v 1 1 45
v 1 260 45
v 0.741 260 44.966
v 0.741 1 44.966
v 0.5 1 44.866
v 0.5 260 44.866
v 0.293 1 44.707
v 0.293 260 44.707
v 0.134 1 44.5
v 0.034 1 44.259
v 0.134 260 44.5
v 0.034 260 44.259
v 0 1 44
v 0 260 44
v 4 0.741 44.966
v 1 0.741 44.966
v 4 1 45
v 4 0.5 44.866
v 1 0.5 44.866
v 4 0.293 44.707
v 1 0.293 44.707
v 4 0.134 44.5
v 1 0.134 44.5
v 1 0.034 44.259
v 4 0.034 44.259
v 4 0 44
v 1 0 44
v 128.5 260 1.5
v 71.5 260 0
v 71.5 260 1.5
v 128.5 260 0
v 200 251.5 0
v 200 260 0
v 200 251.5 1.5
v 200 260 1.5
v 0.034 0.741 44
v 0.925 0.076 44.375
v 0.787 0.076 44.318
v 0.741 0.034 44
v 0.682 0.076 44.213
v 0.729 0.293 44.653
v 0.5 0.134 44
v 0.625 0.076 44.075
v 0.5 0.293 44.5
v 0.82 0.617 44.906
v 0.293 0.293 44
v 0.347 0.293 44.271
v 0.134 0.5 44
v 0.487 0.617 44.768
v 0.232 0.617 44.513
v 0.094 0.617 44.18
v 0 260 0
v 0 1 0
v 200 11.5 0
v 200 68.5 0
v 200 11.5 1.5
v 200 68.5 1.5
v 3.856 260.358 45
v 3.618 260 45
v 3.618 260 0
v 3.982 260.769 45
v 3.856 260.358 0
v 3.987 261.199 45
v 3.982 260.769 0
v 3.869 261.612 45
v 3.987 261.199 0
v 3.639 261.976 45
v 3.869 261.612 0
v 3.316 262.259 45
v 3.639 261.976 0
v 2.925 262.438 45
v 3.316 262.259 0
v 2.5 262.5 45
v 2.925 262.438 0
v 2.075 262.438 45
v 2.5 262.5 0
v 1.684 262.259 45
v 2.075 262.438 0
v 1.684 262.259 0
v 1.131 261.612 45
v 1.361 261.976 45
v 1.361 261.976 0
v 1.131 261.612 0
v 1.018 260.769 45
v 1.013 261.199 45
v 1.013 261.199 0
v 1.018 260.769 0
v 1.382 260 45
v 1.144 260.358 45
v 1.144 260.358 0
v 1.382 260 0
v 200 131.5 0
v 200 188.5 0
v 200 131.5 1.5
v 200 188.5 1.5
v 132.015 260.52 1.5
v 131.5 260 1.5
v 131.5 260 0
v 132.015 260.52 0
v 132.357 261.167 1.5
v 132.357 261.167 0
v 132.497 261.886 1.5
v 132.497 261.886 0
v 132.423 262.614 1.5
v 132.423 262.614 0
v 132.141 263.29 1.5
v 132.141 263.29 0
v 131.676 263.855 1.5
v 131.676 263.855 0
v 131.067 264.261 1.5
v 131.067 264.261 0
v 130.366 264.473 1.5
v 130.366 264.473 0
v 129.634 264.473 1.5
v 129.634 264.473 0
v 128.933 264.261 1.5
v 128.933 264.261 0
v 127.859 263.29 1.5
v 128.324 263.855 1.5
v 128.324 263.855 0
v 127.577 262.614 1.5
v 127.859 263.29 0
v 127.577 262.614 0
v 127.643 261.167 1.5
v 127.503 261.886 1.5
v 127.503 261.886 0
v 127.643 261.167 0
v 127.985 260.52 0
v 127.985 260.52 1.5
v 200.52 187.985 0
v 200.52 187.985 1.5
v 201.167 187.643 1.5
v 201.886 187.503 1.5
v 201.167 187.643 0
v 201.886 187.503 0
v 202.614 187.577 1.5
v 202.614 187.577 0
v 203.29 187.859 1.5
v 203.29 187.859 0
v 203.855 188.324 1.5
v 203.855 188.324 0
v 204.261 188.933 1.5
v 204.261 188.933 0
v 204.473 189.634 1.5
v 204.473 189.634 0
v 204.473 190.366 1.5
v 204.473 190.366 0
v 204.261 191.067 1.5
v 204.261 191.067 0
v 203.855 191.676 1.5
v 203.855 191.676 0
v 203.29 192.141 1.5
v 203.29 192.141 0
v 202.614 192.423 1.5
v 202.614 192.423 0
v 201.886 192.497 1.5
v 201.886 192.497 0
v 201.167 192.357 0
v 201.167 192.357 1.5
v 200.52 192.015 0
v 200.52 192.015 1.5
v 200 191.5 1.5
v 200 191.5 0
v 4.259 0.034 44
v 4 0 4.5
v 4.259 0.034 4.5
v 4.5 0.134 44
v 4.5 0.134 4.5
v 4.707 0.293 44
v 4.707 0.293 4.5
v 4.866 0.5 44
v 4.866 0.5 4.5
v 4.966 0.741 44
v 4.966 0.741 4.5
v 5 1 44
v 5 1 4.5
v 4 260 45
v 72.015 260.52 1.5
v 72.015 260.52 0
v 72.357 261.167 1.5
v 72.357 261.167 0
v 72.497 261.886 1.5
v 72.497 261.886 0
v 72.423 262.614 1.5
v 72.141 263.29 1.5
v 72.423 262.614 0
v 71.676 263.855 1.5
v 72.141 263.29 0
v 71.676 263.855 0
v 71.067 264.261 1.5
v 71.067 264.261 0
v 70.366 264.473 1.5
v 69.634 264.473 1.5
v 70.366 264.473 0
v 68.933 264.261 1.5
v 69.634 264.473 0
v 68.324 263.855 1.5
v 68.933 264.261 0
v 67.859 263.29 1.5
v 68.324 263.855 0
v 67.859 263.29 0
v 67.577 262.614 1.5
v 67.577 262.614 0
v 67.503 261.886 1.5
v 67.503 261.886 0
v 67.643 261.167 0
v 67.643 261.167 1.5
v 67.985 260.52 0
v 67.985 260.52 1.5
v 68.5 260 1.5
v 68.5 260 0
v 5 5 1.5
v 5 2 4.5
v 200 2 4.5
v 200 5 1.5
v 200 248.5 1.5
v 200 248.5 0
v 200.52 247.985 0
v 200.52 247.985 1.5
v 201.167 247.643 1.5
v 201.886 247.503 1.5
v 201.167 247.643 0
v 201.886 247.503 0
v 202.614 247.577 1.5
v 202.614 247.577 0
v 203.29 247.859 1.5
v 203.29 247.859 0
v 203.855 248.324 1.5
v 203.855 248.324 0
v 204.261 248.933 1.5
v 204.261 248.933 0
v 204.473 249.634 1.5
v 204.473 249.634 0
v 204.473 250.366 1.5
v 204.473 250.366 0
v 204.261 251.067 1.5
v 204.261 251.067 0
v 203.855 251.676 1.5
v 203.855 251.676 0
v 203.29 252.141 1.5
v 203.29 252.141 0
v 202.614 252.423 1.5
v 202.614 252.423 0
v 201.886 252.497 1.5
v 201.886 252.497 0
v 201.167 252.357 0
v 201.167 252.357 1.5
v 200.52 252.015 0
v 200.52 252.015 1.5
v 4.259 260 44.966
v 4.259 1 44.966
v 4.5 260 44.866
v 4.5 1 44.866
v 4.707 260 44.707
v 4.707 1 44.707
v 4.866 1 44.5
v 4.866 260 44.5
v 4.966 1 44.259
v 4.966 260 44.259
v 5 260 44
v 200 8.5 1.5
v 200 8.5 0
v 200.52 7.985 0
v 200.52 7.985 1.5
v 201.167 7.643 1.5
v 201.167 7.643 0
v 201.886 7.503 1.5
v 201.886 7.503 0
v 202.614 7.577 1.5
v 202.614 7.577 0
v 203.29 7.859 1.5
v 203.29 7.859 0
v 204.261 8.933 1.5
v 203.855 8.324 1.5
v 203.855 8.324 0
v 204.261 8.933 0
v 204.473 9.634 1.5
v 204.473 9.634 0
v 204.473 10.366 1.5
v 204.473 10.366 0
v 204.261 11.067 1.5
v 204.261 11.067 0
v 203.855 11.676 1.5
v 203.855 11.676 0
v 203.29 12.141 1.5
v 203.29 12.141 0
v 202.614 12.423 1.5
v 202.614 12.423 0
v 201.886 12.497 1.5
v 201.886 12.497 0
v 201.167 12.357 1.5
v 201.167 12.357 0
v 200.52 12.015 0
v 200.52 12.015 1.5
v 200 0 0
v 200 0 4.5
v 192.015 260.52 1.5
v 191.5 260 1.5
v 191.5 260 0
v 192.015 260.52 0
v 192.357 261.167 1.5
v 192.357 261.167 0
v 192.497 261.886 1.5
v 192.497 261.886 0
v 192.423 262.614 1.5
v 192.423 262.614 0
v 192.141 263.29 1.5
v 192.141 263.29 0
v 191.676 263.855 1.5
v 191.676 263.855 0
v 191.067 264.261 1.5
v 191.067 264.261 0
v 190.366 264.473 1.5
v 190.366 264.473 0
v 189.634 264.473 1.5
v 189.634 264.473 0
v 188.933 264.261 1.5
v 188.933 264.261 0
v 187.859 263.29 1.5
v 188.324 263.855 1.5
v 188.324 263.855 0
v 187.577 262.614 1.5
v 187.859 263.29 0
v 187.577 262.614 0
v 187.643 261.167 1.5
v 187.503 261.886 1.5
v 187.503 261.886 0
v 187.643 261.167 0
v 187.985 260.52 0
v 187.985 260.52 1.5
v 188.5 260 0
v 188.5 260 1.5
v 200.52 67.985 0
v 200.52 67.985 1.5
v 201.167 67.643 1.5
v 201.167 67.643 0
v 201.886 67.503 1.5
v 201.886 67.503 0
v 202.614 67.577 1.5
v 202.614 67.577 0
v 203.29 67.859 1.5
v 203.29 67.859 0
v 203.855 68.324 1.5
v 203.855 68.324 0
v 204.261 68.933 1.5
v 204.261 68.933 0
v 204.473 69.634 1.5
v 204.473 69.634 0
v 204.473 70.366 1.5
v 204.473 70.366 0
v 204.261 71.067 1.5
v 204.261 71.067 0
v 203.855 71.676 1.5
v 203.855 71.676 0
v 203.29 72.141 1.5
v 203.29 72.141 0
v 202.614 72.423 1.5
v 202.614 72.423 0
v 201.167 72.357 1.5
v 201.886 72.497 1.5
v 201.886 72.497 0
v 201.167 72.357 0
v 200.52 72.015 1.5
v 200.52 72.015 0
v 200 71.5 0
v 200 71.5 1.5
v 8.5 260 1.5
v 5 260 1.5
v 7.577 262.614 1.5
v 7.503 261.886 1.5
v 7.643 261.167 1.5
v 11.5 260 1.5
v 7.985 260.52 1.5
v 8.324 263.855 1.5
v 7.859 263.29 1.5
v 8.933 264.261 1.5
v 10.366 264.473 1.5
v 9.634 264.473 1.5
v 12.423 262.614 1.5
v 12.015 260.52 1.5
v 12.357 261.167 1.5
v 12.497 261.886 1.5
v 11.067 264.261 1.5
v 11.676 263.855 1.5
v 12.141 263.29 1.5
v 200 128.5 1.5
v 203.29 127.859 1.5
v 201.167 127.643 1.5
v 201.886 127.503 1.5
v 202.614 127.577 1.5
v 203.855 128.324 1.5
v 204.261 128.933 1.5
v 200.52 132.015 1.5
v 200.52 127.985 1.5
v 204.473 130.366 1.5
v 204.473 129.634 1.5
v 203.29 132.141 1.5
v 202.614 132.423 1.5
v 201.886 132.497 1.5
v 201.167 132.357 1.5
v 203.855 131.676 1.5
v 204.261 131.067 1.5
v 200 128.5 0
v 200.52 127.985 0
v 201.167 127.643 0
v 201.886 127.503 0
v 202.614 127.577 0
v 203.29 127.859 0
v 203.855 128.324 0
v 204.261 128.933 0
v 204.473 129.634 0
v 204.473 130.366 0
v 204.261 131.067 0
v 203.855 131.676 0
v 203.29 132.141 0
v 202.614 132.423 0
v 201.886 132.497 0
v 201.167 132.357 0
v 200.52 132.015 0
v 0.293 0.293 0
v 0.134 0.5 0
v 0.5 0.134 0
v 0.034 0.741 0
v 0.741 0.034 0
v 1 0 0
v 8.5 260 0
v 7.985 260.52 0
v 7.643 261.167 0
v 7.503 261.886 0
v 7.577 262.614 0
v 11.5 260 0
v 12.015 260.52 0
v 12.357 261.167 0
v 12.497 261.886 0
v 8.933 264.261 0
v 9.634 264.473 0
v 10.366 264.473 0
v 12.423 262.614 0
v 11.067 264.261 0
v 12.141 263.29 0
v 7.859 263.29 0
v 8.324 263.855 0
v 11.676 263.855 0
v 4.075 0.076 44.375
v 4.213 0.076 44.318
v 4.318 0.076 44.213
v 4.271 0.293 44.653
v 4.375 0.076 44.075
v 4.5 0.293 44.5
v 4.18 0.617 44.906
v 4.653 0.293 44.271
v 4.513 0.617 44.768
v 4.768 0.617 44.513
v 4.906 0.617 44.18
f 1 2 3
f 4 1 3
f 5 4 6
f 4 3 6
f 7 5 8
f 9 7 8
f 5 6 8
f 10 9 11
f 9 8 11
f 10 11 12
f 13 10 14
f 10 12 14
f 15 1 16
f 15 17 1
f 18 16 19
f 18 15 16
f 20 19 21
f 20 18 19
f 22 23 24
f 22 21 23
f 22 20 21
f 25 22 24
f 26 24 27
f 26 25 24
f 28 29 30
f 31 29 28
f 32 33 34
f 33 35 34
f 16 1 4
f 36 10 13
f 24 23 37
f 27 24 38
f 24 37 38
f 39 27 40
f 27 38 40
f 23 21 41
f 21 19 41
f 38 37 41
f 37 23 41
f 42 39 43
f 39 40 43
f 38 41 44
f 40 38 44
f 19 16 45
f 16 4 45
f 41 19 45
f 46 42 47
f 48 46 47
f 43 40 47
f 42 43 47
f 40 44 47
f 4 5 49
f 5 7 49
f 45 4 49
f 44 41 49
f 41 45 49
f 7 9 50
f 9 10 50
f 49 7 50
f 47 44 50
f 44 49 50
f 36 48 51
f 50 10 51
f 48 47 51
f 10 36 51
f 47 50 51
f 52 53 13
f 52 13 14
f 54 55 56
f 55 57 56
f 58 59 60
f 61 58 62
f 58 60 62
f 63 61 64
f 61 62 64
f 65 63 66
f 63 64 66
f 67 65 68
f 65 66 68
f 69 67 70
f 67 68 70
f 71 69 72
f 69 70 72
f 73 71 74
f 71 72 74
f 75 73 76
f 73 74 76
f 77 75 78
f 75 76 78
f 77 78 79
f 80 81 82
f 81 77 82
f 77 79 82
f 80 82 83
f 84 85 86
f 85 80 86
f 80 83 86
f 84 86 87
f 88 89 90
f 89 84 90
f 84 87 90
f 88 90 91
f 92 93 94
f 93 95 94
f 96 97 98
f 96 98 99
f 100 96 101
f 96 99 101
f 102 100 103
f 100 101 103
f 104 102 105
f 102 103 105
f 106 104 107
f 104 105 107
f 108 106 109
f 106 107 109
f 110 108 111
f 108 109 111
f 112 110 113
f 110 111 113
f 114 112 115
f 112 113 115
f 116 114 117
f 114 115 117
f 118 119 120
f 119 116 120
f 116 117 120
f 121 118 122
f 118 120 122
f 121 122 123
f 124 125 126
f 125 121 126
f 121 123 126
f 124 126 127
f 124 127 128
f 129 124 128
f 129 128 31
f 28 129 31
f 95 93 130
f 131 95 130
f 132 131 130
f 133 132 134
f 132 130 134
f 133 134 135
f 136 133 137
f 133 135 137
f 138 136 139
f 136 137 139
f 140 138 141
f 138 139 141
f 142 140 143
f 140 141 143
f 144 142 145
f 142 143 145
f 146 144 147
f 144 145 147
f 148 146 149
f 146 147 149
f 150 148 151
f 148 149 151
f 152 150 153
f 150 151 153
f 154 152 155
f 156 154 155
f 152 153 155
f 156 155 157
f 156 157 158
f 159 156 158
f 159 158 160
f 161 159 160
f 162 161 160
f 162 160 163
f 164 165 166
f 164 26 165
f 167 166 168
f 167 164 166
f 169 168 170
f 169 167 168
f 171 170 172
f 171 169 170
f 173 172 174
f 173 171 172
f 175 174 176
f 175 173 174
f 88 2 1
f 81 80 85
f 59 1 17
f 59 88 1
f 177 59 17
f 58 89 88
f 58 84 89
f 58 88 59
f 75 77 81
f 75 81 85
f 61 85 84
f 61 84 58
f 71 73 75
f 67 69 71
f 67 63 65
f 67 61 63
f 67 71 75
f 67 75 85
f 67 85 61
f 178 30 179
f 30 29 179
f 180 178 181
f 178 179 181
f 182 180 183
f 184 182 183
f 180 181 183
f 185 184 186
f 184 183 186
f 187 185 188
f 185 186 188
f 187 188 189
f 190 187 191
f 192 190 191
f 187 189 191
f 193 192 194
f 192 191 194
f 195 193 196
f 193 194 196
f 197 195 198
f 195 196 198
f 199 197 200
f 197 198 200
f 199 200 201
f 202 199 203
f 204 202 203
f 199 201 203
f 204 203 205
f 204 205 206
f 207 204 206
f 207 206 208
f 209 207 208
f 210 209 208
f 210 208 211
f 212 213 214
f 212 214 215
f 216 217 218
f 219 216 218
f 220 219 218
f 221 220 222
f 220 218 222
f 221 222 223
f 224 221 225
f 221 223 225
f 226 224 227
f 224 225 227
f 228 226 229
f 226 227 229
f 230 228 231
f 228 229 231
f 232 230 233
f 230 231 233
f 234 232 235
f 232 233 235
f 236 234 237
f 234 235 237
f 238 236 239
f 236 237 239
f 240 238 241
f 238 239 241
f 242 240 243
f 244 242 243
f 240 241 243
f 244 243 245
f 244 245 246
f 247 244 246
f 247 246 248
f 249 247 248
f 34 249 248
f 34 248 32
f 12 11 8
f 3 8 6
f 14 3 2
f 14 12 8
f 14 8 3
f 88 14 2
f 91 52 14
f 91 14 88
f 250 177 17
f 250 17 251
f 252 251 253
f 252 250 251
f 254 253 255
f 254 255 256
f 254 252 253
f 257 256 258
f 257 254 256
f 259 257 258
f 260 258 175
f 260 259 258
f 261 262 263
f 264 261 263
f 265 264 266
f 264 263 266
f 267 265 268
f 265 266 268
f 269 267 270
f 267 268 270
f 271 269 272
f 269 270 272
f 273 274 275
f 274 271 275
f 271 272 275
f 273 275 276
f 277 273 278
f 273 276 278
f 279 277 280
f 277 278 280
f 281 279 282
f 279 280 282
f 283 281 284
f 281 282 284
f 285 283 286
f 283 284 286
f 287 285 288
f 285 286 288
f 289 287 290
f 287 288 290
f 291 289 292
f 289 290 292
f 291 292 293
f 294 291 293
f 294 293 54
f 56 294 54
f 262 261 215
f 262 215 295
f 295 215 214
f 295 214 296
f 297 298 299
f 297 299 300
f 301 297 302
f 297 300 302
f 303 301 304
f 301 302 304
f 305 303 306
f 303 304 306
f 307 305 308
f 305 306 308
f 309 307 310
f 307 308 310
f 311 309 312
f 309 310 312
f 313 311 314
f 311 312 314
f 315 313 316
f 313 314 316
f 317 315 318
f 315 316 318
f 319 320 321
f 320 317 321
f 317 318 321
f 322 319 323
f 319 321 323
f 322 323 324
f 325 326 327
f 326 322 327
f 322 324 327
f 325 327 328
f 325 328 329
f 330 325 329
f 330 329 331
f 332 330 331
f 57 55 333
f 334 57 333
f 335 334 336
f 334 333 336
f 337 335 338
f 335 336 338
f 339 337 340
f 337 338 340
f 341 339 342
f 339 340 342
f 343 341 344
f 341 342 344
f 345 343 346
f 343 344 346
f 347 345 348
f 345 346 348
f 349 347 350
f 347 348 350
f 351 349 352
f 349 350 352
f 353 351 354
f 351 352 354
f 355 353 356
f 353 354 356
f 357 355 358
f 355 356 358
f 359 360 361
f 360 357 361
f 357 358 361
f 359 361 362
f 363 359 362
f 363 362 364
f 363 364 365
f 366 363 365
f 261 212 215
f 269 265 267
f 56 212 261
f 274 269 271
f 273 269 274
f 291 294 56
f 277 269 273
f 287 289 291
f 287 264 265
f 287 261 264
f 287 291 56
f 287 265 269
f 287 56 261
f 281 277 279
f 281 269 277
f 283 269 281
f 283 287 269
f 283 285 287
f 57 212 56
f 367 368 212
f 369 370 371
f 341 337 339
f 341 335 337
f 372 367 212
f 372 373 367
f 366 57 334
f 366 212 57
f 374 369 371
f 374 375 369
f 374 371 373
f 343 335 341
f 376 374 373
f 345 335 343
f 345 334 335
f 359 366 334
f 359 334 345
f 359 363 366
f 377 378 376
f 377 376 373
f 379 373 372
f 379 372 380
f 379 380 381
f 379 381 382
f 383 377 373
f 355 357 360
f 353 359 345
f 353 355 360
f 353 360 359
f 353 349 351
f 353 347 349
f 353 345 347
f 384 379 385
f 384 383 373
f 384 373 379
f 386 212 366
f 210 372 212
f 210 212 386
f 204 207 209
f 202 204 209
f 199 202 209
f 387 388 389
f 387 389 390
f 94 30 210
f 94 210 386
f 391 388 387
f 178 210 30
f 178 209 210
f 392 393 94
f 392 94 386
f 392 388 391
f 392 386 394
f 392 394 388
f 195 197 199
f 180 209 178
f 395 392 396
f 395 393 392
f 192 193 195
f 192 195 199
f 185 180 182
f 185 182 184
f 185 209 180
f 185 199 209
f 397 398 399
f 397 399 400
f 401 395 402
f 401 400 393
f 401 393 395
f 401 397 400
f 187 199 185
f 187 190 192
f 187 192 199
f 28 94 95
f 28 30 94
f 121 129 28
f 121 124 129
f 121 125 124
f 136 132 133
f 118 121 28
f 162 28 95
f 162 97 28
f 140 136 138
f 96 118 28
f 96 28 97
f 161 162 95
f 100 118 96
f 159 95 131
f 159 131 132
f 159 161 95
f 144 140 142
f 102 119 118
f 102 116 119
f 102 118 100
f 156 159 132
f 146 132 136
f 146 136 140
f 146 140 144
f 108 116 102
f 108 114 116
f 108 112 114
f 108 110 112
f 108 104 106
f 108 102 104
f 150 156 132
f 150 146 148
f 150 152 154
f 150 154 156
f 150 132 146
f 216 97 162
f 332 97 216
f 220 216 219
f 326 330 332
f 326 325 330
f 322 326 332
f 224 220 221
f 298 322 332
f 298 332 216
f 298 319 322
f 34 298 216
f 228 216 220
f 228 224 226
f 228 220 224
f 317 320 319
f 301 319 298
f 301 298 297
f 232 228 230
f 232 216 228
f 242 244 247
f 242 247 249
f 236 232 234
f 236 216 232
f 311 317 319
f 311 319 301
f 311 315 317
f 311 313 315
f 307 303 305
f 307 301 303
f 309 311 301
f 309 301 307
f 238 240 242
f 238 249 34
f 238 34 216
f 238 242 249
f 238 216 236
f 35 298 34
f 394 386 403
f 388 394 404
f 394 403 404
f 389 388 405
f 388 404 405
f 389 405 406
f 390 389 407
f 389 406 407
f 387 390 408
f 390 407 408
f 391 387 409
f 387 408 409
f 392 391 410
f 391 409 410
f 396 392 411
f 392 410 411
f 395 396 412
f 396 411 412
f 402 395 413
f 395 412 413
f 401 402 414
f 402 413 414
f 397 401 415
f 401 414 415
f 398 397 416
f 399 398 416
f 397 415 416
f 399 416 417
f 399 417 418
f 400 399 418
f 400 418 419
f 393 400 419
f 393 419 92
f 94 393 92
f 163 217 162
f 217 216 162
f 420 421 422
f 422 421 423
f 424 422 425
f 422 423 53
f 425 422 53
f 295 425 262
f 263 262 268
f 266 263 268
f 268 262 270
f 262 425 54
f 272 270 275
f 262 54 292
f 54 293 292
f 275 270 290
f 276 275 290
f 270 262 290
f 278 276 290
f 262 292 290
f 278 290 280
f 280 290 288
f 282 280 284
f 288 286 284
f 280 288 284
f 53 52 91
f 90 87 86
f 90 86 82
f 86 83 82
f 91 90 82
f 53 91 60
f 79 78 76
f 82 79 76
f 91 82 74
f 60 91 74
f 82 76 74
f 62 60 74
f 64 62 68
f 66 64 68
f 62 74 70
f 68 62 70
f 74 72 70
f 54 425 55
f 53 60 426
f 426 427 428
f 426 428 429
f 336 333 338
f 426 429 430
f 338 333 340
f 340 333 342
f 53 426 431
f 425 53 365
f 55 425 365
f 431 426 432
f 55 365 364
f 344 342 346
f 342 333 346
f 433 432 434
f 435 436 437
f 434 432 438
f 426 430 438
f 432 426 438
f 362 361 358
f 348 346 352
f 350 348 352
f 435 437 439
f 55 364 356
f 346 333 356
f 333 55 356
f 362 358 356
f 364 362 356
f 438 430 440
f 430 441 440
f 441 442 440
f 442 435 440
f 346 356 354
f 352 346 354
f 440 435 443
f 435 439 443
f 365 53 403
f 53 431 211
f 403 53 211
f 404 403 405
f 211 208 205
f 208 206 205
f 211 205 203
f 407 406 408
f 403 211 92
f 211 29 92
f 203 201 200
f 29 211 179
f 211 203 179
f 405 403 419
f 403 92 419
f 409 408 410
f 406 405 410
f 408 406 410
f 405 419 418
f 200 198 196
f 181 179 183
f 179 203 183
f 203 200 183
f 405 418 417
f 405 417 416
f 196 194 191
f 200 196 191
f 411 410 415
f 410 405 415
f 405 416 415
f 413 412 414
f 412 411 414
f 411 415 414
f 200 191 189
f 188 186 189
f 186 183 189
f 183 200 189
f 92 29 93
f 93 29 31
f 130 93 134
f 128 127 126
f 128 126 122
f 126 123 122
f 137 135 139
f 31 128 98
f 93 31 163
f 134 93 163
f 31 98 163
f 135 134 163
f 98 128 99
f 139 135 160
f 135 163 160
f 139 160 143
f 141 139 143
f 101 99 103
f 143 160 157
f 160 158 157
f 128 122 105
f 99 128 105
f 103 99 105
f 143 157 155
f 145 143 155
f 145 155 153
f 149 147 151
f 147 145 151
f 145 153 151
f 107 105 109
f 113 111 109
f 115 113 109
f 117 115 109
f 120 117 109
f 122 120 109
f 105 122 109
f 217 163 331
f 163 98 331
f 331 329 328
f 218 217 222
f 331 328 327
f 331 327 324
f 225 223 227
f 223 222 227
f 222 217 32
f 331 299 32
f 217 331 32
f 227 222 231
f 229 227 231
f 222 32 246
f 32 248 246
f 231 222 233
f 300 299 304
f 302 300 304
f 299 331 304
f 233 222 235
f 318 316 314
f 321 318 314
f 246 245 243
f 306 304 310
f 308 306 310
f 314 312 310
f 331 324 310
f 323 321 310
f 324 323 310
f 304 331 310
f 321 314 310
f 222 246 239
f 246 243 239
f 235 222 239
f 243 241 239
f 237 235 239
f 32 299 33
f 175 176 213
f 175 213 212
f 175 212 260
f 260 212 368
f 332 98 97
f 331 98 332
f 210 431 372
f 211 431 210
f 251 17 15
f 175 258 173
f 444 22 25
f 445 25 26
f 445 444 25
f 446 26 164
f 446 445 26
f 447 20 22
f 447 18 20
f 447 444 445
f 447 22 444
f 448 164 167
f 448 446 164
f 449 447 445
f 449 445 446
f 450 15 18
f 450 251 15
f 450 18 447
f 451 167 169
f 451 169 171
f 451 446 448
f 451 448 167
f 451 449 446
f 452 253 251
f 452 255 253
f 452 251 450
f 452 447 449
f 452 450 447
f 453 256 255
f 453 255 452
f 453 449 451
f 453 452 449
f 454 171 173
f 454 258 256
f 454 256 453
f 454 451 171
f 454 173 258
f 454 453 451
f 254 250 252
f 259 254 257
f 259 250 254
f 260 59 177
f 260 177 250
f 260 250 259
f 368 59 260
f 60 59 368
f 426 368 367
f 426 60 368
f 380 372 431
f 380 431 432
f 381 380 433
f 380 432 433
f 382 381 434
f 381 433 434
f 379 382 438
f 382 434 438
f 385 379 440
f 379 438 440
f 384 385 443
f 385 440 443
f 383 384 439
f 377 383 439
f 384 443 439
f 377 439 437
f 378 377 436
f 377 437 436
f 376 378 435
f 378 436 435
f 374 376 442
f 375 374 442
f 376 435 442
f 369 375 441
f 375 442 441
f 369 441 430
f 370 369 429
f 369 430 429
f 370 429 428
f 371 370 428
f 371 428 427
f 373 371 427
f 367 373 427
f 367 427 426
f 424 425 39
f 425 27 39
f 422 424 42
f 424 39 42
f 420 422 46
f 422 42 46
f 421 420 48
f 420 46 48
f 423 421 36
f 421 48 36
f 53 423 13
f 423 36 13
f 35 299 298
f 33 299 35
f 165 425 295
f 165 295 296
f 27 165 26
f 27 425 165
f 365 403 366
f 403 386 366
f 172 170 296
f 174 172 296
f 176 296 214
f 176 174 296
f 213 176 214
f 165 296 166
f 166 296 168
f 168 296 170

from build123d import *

# Parameters (mm, degrees)
SKETCH001_W            = 200
SKETCH001_H            = 260
PAD_DEPTH              = 1.5
SKETCH002_W            = 5
SKETCH002_H            = 260
PAD001_DEPTH           = 43.5
PAD004_DEPTH           = 195
SKETCH003_R            = 2.5
PAD002_DEPTH           = 1.5
LINEARPATTERN_COUNT    = 5
LINEARPATTERN_PITCH    = 60
SKETCH004_R            = 1.5
PAD003_DEPTH           = 45
SKETCH006_R            = 2.5
PAD005_DEPTH           = 1.5
LINEARPATTERN001_COUNT = 4
LINEARPATTERN001_PITCH = 60
FILLET002_R            = 1


with BuildPart() as part:
    # Sketch001 (on XY_Plane of Origin) → Pad (new body)
    with BuildSketch(Plane.XY):
        with Locations((100, 130)):
            Rectangle(SKETCH001_W, SKETCH001_H)
    extrude(amount=PAD_DEPTH)

    # Sketch002 (on Face6 of Pad) → Pad001 (join)
    with BuildSketch(Plane.XY.offset(1.5)):
        with Locations((2.5, 130)):
            Rectangle(SKETCH002_W, SKETCH002_H)
    extrude(amount=PAD001_DEPTH)

    # Sketch005 (on Face4 of Pad001) → Pad004 (join)
    with BuildSketch(Plane.YZ.offset(5)):
        Polygon((0, 1.5), (0, 4.5), (2, 4.5), (5, 1.5), align=None)
    extrude(amount=PAD004_DEPTH)

    # Sketch003 (on XY_Plane of Origin) → Pad002 (join)
    with BuildSketch(Plane.XY):
        with Locations((202, 10)):
            Circle(SKETCH003_R)
    pad002 = extrude(amount=PAD002_DEPTH)

    # LinearPattern: Pad002 ×5
    with Locations(*[(0, i * LINEARPATTERN_PITCH, 0) for i in range(1, LINEARPATTERN_COUNT)]):
        add(pad002)

    # Sketch004 (on XY_Plane of Origin) → Pad003 (join)
    with BuildSketch(Plane.XY):
        with Locations((2.5, 261)):
            Circle(SKETCH004_R)
    extrude(amount=PAD003_DEPTH)

    # Sketch006 (on XY_Plane of Origin) → Pad005 (join)
    with BuildSketch(Plane.XY):
        with Locations((190, 262)):
            Circle(SKETCH006_R)
    pad005 = extrude(amount=PAD005_DEPTH)

    # LinearPattern001: Pad005 ×4
    with Locations(*[(-i * LINEARPATTERN001_PITCH, 0, 0) for i in range(1, LINEARPATTERN001_COUNT)]):
        add(pad005)

    # Fillet002
    fillet002_edges = [part.edges().sort_by_distance(p)[0] for p in [
        (0, 130, 45),
        (5, 130, 45),
        (2.5, 0, 45),
        (0, 0, 22.5),
        (5, 0, 24.75),
    ]]
    fillet(fillet002_edges, radius=FILLET002_R)


solid = part.part
